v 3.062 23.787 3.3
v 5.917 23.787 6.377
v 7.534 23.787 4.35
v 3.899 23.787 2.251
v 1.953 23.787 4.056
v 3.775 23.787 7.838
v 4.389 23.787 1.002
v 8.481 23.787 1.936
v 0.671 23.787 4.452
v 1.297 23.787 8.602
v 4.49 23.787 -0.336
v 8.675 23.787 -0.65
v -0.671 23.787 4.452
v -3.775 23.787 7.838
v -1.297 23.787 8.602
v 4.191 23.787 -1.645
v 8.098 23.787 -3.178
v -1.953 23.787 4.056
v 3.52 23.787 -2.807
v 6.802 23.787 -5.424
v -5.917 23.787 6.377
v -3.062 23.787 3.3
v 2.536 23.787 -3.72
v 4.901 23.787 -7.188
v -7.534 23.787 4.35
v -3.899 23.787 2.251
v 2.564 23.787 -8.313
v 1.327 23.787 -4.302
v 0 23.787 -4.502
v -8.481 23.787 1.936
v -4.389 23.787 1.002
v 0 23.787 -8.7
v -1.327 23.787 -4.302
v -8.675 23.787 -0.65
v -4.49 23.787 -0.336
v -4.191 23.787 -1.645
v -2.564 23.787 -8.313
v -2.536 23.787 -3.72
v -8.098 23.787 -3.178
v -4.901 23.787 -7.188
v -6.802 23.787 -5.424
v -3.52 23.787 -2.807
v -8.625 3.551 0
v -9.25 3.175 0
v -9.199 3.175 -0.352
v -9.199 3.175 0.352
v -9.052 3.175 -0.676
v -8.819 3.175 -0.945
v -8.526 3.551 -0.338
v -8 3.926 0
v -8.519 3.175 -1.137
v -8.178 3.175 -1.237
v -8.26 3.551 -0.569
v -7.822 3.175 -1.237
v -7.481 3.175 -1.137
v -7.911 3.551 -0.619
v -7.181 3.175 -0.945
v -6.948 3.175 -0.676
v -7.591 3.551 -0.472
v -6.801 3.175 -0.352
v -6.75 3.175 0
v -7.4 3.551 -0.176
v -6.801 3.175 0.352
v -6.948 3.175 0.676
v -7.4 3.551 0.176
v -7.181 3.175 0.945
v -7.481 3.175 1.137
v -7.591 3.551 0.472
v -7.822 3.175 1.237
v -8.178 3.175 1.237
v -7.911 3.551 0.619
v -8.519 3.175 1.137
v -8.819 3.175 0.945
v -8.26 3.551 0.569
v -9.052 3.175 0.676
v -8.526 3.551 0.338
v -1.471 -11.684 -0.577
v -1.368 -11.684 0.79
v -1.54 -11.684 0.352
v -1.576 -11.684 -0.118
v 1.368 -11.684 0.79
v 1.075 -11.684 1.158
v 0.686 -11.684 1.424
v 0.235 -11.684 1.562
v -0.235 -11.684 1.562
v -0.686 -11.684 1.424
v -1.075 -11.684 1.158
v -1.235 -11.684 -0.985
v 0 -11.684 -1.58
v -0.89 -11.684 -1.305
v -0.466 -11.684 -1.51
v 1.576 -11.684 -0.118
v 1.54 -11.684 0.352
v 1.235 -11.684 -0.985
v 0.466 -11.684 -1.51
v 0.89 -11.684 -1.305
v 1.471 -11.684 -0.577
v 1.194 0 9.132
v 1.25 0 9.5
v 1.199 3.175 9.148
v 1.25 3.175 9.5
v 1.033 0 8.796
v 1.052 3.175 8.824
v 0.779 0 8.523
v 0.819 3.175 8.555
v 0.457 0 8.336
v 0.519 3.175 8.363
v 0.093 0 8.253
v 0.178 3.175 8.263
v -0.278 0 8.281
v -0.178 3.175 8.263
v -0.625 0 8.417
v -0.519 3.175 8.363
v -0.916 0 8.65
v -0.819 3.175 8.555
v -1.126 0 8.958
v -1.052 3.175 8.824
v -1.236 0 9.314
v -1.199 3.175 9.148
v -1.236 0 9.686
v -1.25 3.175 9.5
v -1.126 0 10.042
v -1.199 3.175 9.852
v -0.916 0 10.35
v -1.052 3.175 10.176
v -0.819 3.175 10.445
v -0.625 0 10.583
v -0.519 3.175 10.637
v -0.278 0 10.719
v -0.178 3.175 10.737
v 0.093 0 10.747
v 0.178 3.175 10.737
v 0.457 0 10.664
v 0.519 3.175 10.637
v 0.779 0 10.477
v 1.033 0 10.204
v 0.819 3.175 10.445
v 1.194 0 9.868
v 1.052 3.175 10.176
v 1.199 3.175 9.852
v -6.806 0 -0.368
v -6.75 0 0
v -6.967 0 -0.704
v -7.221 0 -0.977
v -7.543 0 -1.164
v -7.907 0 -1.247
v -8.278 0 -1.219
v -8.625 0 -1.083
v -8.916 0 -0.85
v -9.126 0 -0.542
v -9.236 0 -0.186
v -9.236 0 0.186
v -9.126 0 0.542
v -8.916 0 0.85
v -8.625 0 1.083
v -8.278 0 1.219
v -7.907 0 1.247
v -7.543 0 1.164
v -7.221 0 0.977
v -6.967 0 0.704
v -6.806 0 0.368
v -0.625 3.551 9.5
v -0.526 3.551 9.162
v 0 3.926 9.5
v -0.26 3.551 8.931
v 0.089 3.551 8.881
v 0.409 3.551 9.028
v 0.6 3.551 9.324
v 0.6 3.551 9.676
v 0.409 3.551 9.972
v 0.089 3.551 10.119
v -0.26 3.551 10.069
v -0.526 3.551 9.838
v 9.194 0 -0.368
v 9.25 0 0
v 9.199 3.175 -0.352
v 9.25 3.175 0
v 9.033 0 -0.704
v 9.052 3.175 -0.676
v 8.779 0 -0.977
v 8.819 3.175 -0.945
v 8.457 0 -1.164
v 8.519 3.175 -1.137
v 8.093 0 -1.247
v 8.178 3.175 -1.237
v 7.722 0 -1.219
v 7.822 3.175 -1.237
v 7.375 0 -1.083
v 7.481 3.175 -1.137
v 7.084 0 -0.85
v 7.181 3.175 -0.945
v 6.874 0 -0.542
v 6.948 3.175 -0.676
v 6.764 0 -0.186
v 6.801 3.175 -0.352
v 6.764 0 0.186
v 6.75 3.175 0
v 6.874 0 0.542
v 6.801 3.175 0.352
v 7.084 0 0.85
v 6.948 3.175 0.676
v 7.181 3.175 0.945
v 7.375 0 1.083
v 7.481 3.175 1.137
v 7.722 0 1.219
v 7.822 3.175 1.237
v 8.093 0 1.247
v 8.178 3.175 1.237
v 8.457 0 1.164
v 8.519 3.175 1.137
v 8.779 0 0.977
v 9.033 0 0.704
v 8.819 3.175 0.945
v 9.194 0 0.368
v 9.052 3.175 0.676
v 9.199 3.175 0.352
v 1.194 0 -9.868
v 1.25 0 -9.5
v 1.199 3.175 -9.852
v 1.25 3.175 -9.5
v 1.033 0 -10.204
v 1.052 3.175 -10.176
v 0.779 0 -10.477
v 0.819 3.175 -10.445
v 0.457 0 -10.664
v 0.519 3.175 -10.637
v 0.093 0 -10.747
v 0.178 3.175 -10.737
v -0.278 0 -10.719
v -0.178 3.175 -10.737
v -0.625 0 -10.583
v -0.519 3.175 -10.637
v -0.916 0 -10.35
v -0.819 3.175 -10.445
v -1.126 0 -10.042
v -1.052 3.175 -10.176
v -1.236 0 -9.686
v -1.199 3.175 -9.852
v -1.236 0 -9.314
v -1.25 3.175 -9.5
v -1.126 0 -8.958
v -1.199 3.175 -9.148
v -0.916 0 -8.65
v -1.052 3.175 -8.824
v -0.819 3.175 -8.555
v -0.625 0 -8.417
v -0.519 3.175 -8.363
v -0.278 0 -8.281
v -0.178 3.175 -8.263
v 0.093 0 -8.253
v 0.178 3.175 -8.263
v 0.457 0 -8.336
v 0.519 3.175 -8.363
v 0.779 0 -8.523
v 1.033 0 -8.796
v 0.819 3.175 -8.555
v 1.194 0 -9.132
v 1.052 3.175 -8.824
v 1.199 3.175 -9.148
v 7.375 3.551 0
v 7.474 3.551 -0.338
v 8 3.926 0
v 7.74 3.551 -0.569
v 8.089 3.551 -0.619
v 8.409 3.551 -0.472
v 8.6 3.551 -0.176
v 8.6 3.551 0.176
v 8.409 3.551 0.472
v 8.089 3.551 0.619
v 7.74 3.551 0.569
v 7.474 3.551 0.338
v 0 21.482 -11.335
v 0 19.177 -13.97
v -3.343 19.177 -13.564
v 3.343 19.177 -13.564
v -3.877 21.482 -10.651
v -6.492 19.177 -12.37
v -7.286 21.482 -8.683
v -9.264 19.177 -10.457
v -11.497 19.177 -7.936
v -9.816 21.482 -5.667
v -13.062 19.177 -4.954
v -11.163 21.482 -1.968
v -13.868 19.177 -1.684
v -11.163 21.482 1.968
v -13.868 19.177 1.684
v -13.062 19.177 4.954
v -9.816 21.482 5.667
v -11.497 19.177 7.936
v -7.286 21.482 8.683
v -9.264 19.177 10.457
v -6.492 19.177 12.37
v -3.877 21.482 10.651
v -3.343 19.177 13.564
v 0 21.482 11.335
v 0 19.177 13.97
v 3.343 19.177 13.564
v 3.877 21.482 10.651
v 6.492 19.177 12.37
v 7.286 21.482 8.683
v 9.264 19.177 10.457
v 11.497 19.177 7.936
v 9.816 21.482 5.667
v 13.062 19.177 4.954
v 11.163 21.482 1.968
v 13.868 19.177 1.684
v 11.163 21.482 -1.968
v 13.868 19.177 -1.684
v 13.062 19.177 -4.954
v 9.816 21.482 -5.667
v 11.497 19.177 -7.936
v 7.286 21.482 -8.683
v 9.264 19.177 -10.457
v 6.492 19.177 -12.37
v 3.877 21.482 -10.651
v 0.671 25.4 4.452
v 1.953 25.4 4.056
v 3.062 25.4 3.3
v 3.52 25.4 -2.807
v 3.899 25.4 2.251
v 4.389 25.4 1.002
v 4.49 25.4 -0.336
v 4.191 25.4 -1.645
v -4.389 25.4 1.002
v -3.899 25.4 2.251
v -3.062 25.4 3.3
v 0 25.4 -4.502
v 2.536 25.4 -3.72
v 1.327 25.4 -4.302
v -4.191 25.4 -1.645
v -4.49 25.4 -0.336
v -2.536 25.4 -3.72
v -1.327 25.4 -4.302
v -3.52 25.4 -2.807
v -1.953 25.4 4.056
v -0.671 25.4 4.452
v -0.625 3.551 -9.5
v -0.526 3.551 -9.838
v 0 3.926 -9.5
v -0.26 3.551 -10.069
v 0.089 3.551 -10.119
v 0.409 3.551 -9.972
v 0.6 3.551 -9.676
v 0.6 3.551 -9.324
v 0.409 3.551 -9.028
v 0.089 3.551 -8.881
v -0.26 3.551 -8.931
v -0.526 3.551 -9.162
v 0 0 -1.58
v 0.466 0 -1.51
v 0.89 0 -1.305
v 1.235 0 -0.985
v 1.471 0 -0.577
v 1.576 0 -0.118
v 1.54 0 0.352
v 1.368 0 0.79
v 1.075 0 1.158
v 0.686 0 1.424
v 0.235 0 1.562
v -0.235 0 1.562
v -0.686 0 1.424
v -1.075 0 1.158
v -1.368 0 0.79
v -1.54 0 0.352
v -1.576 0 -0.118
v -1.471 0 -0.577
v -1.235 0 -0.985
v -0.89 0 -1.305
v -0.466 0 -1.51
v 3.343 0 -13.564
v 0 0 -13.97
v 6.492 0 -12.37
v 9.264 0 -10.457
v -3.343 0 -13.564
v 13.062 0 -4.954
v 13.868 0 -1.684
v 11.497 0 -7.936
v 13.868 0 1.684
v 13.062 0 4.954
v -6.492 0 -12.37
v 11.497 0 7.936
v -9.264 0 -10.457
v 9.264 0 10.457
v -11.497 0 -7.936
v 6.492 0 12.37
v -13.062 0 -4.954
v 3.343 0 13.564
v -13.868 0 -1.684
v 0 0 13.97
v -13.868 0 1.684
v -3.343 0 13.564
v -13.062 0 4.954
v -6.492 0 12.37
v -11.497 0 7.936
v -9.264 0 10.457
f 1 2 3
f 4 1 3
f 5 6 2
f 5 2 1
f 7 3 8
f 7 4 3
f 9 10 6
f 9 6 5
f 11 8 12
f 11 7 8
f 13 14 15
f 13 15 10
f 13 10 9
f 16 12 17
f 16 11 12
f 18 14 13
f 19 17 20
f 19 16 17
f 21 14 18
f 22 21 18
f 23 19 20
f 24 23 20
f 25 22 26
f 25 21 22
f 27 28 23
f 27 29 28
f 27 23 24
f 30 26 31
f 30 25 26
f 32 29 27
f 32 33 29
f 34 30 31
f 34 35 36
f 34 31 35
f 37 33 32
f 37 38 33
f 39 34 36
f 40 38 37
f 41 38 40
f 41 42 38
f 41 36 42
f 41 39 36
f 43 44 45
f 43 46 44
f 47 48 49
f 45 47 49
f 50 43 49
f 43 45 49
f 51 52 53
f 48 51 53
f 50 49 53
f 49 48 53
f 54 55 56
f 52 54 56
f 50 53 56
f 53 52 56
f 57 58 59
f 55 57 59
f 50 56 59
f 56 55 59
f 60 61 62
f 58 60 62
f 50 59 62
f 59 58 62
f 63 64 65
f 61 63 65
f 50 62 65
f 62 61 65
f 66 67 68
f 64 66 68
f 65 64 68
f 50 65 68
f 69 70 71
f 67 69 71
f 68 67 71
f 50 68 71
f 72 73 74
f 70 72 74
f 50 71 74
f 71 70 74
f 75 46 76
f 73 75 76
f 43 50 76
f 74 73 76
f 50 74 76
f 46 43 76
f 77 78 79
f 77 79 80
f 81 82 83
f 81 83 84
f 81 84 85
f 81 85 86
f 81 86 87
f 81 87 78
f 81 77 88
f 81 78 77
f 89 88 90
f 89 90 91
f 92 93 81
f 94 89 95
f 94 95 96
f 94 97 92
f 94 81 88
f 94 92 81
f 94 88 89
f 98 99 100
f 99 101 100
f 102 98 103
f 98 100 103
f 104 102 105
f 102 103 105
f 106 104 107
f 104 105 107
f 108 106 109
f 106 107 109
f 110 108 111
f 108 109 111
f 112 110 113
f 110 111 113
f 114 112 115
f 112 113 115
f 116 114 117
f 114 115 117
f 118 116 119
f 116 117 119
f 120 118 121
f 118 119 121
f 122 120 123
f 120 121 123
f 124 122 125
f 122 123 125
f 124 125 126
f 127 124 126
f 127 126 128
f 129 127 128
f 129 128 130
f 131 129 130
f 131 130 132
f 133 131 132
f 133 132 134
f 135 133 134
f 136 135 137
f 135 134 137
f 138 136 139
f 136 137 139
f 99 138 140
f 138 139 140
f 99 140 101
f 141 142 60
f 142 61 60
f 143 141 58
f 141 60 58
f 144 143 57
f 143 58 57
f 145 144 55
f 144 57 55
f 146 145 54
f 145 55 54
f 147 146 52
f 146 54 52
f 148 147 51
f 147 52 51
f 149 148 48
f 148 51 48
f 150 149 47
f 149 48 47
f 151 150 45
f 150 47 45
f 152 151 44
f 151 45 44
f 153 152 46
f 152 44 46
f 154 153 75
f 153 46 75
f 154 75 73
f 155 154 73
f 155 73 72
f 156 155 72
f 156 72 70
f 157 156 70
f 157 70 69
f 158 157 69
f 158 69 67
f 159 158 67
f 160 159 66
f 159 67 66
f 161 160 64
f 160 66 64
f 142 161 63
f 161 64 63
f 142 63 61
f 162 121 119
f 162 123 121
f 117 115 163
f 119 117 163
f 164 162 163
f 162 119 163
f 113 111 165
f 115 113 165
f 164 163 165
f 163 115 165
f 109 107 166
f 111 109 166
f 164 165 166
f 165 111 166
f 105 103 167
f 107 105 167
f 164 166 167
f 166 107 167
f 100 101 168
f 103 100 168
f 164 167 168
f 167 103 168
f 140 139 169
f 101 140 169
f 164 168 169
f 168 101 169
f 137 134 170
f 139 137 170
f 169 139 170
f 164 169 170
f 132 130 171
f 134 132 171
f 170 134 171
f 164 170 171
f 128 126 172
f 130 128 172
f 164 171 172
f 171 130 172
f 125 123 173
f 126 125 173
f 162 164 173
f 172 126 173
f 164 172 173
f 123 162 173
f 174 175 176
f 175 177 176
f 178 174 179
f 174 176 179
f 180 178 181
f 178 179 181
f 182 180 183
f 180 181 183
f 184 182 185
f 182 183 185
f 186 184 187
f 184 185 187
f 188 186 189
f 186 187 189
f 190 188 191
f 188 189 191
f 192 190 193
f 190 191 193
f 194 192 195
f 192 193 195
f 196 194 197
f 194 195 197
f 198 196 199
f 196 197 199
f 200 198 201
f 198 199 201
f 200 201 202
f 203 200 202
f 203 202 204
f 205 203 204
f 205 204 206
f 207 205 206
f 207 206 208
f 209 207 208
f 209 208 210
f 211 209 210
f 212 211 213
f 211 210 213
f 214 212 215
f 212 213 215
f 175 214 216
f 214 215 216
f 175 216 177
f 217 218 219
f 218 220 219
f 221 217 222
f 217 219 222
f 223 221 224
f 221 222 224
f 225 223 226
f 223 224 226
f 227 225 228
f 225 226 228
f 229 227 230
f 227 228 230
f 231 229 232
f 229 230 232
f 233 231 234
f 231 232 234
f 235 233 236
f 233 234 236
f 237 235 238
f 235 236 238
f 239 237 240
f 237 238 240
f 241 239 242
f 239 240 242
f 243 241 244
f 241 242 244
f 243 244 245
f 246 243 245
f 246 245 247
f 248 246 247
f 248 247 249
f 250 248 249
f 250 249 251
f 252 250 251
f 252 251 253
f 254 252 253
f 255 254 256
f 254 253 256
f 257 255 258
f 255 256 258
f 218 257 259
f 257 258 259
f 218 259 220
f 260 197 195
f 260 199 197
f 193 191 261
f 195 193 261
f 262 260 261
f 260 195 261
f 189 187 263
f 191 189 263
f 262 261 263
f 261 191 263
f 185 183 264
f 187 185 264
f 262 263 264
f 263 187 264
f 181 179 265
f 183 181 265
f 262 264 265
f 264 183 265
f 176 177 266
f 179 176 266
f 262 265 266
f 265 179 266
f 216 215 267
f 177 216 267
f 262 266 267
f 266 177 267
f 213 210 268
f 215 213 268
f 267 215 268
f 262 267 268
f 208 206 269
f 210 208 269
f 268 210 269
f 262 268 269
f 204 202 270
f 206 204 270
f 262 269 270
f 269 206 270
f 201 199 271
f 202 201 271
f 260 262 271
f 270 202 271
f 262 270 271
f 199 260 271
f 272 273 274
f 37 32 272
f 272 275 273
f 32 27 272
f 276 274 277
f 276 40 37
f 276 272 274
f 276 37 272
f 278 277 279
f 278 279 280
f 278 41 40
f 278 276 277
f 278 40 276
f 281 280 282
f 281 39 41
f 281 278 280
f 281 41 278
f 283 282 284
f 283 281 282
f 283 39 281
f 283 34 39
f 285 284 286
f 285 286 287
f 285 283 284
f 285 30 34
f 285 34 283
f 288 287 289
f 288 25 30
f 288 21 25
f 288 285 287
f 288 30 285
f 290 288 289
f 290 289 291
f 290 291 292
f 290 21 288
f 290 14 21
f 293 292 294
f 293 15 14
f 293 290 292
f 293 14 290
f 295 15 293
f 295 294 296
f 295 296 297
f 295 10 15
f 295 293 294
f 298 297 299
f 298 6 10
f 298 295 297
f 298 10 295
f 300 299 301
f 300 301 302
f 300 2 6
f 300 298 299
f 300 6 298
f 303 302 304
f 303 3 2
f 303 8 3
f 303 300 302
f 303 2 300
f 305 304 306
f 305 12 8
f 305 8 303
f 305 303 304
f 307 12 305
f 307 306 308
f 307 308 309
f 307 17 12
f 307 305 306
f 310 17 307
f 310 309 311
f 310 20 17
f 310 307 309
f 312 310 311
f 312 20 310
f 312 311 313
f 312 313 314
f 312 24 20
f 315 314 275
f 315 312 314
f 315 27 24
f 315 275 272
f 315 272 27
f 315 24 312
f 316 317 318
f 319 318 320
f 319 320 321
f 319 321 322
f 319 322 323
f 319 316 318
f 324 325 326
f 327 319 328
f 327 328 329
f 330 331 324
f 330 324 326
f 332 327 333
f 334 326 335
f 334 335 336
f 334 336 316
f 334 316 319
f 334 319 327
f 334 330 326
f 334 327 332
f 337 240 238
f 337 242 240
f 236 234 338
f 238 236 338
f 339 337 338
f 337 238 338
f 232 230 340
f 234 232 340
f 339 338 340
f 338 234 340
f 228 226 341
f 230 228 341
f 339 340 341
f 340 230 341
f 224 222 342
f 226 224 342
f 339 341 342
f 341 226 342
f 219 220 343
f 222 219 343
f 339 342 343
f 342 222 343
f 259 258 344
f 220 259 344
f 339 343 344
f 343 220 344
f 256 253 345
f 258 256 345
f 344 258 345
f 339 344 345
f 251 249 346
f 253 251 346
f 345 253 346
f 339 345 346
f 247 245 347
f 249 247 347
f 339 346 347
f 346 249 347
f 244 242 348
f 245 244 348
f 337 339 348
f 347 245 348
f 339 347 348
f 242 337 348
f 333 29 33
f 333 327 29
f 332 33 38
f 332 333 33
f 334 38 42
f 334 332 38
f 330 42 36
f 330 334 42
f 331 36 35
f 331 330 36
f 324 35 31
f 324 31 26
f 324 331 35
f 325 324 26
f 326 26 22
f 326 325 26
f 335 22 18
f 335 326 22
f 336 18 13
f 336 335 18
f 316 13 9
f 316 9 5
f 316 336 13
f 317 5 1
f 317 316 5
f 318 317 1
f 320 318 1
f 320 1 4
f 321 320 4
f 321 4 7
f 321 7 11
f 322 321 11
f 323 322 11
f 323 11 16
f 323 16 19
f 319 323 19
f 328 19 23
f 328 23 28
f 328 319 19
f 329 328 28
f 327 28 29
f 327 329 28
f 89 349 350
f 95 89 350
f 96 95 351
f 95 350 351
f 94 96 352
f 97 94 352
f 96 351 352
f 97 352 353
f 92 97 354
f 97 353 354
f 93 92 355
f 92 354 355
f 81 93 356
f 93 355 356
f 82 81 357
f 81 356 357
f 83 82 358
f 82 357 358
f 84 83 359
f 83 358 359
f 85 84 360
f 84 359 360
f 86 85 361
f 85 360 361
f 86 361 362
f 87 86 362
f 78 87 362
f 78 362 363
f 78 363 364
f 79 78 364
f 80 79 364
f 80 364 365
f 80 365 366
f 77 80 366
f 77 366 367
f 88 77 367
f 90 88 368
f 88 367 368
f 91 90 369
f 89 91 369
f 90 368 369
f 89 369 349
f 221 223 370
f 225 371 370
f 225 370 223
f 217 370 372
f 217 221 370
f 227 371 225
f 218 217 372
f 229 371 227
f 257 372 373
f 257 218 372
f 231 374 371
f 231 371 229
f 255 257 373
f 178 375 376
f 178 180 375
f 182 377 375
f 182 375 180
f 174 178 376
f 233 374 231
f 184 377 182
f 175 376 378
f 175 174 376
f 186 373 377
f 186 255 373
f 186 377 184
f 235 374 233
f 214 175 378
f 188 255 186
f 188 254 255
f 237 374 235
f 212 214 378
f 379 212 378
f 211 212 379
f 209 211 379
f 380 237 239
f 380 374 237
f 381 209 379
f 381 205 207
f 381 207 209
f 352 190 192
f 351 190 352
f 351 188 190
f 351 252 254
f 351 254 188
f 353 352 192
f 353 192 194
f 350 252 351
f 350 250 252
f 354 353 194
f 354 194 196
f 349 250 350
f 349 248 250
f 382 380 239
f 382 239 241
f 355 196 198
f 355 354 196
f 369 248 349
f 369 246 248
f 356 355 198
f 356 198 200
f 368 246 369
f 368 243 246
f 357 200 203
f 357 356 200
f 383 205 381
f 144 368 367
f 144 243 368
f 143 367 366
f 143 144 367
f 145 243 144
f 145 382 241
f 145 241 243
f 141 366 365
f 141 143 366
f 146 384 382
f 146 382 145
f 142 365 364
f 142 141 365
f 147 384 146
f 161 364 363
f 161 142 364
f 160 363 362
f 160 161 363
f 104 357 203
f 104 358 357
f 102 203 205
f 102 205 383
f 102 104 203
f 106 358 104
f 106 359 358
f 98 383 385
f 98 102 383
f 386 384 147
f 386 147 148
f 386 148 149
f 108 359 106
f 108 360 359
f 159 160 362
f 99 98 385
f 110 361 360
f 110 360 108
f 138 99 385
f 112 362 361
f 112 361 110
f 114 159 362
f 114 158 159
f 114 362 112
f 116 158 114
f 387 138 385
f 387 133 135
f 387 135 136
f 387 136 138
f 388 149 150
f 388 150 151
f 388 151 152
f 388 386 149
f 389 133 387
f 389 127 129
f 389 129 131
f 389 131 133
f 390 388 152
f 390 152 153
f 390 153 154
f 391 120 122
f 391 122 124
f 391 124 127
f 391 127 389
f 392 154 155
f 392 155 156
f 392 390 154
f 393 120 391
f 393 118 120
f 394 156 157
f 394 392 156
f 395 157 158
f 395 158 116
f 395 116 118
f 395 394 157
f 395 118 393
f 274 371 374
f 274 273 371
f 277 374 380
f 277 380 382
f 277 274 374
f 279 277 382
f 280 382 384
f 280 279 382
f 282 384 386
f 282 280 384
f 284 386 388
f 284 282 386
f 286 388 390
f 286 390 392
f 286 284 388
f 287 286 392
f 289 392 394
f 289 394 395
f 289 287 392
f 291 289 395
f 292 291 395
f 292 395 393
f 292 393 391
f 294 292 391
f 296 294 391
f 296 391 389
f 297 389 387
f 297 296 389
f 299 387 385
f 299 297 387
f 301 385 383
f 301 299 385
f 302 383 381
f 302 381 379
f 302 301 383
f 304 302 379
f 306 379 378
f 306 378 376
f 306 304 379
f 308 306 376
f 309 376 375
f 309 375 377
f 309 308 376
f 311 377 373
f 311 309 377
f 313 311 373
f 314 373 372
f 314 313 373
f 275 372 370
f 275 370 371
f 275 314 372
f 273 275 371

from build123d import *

# Parameters (mm, degrees)
SKETCH2_R                           = 1.58
BOSS_EXTRUDE1_DEPTH                 = 11.684
M3X0_5_BOTTOMING_TAPPED_HOLE1_D     = 2.5
M3X0_5_BOTTOMING_TAPPED_HOLE1_DEPTH = 3.175
M3X0_5_BOTTOMING_TAPPED_HOLE1_TIP   = 0.751075774


with BuildPart() as part:
    # Sketch1 → Revolve1 (revolve)
    with BuildSketch(Plane.XY, mode=Mode.PRIVATE) as revolve1_sk:
        Polygon((0, 0), (13.97, 0), (13.97, 19.177), (8.6995, 23.7871), (4.50215, 23.7871), (4.50215, 25.4), (0, 25.4), align=None)
    revolve(revolve1_sk.sketch.rotate(Axis((0, 0, 0), (0, 1, 0)), 90), axis=Axis((0, 0, 0), (0, 1, 0)))

    # Sketch2 → Boss-Extrude1 (add)
    with BuildSketch(Plane.XZ):
        with Locations(Location((0, 0, 0), (0, 0, 270))):
            Circle(SKETCH2_R)
    extrude(amount=BOSS_EXTRUDE1_DEPTH)

    # M3x0.5 Bottoming Tapped Hole1
    with Locations(Plane(origin=(0, 0, 0), x_dir=(-1, 0, 0), z_dir=(0, -1, 0))):
        with Locations((-8, 0), (8, 0), (0, -9.5), (0, 9.5)):
            Hole(M3X0_5_BOTTOMING_TAPPED_HOLE1_D / 2, depth=M3X0_5_BOTTOMING_TAPPED_HOLE1_DEPTH)
            with Locations((0, 0, -(M3X0_5_BOTTOMING_TAPPED_HOLE1_DEPTH + M3X0_5_BOTTOMING_TAPPED_HOLE1_TIP / 2))):  # 118° drill point
                Cone(0, M3X0_5_BOTTOMING_TAPPED_HOLE1_D / 2, M3X0_5_BOTTOMING_TAPPED_HOLE1_TIP, mode=Mode.SUBTRACT)


solid = part.part
